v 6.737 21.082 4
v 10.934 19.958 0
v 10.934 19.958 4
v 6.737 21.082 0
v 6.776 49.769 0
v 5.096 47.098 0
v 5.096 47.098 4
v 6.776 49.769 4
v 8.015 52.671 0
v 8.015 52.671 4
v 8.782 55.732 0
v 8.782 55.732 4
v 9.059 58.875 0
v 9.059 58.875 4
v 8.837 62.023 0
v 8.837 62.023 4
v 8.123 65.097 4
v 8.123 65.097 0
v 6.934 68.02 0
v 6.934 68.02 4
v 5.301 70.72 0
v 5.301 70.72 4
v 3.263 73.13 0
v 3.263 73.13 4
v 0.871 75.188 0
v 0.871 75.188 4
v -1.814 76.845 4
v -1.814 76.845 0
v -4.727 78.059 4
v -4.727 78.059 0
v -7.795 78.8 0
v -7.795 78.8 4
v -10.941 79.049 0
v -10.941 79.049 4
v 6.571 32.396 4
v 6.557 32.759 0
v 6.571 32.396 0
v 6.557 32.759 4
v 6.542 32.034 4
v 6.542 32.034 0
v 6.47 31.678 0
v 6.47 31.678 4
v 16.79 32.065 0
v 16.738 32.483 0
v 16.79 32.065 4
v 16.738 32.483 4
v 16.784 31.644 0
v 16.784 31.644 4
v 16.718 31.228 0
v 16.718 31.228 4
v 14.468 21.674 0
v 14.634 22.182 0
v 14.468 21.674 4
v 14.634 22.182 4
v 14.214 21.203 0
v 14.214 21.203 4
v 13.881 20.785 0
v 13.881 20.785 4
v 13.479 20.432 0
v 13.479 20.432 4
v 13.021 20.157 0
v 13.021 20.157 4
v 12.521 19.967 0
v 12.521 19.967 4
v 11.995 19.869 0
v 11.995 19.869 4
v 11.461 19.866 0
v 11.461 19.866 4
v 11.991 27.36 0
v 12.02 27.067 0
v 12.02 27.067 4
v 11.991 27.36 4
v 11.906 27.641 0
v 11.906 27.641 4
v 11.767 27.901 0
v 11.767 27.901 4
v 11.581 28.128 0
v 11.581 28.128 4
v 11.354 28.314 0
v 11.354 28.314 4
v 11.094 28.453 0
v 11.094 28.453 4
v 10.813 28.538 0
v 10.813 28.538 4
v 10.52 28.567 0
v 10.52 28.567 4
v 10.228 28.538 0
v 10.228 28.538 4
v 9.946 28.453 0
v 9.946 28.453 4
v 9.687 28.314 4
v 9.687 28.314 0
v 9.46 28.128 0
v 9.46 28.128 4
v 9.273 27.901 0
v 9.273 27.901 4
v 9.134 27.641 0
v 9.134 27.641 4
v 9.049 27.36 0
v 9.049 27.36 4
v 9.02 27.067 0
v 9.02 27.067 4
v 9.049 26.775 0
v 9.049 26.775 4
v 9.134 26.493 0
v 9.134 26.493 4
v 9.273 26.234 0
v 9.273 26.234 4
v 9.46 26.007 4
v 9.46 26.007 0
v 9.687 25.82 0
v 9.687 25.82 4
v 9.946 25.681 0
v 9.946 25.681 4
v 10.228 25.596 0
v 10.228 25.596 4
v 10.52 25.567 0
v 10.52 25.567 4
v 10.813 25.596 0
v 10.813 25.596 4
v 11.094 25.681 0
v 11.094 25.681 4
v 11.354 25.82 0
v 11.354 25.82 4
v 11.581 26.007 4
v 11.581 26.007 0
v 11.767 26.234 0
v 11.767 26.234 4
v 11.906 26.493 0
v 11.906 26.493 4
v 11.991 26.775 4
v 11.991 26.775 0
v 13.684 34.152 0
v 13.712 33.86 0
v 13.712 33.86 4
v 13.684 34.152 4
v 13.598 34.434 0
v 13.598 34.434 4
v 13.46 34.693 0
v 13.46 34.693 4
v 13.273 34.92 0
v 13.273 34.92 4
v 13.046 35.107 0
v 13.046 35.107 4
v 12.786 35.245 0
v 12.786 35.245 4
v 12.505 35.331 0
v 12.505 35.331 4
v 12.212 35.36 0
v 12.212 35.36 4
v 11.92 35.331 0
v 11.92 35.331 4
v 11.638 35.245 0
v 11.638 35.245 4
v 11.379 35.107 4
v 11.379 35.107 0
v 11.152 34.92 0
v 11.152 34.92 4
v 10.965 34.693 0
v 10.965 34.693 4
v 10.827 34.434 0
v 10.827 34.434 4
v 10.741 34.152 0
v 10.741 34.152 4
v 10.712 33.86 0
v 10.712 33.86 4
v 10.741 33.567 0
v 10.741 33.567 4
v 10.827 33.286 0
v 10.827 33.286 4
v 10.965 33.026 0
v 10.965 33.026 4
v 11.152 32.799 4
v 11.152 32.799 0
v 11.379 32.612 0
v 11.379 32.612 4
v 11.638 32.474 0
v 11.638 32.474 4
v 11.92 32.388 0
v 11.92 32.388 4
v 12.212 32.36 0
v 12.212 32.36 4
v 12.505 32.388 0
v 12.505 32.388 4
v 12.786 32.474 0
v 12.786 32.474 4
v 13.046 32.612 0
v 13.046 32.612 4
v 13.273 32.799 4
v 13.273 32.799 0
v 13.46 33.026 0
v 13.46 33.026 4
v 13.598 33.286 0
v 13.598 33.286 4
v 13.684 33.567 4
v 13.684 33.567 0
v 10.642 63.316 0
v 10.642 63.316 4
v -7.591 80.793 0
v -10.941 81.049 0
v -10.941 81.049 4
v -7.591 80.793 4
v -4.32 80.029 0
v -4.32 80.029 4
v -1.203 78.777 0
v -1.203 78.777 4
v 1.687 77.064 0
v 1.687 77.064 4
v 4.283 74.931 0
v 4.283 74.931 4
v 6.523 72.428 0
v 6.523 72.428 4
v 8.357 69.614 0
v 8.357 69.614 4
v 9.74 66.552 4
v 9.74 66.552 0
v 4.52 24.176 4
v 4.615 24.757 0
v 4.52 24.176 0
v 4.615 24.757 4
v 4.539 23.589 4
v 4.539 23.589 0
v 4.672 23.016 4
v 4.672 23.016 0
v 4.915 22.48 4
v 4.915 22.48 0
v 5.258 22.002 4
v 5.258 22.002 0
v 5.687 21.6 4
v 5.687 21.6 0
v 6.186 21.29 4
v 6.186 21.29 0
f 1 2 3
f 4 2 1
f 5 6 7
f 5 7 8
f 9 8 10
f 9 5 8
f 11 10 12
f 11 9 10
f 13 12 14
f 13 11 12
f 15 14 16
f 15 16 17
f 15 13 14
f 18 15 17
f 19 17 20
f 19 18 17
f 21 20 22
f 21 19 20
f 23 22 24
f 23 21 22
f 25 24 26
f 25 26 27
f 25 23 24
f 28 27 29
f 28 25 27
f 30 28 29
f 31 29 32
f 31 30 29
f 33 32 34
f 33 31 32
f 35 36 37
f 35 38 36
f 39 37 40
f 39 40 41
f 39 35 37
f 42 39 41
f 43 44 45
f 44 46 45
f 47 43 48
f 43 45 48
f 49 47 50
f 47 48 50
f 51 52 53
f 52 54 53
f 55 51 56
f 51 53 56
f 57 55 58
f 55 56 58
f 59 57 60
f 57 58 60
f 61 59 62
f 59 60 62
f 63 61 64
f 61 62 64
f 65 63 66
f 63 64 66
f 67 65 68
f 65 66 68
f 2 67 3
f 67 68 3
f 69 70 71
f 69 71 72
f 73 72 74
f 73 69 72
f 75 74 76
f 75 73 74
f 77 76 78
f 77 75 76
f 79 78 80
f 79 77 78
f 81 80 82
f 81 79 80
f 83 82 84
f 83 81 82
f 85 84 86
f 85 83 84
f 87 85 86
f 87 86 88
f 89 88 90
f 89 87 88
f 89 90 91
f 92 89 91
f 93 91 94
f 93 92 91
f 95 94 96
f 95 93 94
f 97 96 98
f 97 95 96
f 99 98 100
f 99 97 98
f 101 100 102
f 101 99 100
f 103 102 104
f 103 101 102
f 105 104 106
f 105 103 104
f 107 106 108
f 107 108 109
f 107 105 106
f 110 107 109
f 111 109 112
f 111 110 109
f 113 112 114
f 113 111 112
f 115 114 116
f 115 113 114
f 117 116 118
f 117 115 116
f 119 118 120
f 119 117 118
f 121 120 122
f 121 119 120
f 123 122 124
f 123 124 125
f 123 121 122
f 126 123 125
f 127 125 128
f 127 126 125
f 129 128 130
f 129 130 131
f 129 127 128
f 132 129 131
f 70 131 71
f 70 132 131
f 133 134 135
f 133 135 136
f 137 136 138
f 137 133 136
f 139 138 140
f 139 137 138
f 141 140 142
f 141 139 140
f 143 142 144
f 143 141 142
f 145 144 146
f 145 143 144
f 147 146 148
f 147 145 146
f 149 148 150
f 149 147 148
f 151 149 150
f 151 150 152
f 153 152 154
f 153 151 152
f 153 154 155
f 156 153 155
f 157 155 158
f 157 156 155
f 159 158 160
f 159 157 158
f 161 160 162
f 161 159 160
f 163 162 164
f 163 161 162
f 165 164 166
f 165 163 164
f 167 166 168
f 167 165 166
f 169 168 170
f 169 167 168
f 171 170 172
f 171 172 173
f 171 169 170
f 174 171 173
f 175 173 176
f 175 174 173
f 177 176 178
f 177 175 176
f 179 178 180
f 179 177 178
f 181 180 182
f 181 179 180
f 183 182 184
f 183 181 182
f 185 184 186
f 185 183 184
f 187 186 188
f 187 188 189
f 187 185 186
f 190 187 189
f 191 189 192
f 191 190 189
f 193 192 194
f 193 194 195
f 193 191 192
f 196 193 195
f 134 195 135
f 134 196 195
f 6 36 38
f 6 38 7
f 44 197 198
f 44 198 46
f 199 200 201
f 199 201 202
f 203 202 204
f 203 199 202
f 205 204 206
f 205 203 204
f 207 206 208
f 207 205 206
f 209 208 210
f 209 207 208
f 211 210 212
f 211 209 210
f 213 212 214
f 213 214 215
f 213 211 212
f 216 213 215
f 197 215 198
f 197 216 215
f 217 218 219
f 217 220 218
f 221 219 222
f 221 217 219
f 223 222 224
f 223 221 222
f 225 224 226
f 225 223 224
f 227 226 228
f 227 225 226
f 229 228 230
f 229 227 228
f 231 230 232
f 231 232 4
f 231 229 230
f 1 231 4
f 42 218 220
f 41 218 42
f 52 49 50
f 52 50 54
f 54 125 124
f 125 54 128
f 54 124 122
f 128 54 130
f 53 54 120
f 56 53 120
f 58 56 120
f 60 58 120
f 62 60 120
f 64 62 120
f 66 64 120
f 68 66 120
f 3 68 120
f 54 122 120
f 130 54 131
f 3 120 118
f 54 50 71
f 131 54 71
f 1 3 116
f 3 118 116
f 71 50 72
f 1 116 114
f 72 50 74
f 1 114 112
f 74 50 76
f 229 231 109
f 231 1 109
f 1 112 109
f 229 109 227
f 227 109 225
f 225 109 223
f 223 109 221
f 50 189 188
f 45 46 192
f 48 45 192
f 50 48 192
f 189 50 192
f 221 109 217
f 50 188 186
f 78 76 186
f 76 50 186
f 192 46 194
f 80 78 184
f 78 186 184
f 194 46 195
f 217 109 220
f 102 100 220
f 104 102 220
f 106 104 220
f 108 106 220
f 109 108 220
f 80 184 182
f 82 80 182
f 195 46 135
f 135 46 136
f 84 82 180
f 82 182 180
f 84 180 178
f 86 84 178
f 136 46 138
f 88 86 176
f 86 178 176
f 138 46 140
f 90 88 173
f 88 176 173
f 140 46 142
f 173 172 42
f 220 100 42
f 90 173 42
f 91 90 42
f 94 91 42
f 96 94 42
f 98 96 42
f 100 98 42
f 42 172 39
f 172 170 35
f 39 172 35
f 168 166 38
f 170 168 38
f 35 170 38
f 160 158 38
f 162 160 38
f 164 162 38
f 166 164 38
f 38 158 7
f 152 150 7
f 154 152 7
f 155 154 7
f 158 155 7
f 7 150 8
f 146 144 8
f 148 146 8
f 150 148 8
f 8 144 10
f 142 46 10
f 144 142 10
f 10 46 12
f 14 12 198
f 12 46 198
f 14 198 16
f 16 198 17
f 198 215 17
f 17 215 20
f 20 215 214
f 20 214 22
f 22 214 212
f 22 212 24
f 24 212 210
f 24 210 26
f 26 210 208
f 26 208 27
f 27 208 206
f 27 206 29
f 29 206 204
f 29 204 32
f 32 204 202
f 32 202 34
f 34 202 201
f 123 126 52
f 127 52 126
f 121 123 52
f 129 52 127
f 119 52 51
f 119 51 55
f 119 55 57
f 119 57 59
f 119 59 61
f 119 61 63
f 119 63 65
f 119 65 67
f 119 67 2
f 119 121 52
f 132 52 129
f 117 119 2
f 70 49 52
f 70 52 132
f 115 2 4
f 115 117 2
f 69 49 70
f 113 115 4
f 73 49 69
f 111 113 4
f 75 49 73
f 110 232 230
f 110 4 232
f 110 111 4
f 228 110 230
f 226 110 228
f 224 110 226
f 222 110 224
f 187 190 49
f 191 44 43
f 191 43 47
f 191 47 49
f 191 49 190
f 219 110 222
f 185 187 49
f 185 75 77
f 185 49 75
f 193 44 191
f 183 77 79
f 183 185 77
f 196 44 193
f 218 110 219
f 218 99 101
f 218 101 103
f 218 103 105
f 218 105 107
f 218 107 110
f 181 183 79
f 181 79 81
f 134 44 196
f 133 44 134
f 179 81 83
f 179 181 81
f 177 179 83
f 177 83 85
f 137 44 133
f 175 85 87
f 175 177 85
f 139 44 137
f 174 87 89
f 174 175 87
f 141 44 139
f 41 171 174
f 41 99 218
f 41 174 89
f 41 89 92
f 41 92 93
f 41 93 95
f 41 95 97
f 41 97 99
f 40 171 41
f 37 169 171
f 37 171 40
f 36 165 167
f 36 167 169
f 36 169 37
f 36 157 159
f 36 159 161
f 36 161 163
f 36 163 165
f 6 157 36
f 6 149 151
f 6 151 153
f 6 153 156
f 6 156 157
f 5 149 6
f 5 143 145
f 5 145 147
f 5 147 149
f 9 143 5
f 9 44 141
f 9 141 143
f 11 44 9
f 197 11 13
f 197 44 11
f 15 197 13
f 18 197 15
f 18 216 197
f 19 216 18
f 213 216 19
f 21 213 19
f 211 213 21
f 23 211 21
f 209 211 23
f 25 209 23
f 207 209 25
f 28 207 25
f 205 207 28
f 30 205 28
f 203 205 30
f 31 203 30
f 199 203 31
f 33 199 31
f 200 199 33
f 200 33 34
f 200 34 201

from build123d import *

# Parameters (mm, degrees)
SKETCH_1_R      = 1.5
EXTRUDE_1_DEPTH = 4
FILLET_1_R      = 3


with BuildPart() as part:
    # 草图1 → 凸台-拉伸1 (new body)
    with BuildSketch(Plane.XY):
        with BuildLine():
            Line((-10.940603829, 79.049047398), (-10.940603829, 81.049047398))
            ThreePointArc((-10.940603829, 81.049047398), (3.025840458, 76.047236536), (10.641601769, 63.316177759))
            Line((10.641601769, 63.316177759), (16.862252241, 31.85349767))
            Line((16.862252241, 31.85349767), (13.93581935, 19.153521371))
            Line((13.93581935, 19.153521371), (3.838956556, 21.858772904))
            Line((3.838956556, 21.858772904), (6.612464071, 32.210388823))
            Line((6.612464071, 32.210388823), (5.095703598, 47.097610493))
            ThreePointArc((5.095703598, 47.097610493), (6.934361039, 68.020425829), (-10.940603829, 79.049047398))
        make_face()
        with Locations((10.520263625, 27.067195715)):
            Circle(SKETCH_1_R, mode=Mode.SUBTRACT)
        with Locations((12.212445248, 33.85958273)):
            Circle(SKETCH_1_R, mode=Mode.SUBTRACT)
    extrude(amount=EXTRUDE_1_DEPTH)

    # 圆角1
    fillet_1_edges = [part.edges().sort_by_distance(p)[0] for p in [
        (16.862252241, 31.85349767, 2),
        (13.93581935, 19.153521371, 2),
        (3.838956556, 21.858772904, 2),
        (6.612464071, 32.210388823, 2),
    ]]
    fillet(fillet_1_edges, radius=FILLET_1_R)


solid = part.part
